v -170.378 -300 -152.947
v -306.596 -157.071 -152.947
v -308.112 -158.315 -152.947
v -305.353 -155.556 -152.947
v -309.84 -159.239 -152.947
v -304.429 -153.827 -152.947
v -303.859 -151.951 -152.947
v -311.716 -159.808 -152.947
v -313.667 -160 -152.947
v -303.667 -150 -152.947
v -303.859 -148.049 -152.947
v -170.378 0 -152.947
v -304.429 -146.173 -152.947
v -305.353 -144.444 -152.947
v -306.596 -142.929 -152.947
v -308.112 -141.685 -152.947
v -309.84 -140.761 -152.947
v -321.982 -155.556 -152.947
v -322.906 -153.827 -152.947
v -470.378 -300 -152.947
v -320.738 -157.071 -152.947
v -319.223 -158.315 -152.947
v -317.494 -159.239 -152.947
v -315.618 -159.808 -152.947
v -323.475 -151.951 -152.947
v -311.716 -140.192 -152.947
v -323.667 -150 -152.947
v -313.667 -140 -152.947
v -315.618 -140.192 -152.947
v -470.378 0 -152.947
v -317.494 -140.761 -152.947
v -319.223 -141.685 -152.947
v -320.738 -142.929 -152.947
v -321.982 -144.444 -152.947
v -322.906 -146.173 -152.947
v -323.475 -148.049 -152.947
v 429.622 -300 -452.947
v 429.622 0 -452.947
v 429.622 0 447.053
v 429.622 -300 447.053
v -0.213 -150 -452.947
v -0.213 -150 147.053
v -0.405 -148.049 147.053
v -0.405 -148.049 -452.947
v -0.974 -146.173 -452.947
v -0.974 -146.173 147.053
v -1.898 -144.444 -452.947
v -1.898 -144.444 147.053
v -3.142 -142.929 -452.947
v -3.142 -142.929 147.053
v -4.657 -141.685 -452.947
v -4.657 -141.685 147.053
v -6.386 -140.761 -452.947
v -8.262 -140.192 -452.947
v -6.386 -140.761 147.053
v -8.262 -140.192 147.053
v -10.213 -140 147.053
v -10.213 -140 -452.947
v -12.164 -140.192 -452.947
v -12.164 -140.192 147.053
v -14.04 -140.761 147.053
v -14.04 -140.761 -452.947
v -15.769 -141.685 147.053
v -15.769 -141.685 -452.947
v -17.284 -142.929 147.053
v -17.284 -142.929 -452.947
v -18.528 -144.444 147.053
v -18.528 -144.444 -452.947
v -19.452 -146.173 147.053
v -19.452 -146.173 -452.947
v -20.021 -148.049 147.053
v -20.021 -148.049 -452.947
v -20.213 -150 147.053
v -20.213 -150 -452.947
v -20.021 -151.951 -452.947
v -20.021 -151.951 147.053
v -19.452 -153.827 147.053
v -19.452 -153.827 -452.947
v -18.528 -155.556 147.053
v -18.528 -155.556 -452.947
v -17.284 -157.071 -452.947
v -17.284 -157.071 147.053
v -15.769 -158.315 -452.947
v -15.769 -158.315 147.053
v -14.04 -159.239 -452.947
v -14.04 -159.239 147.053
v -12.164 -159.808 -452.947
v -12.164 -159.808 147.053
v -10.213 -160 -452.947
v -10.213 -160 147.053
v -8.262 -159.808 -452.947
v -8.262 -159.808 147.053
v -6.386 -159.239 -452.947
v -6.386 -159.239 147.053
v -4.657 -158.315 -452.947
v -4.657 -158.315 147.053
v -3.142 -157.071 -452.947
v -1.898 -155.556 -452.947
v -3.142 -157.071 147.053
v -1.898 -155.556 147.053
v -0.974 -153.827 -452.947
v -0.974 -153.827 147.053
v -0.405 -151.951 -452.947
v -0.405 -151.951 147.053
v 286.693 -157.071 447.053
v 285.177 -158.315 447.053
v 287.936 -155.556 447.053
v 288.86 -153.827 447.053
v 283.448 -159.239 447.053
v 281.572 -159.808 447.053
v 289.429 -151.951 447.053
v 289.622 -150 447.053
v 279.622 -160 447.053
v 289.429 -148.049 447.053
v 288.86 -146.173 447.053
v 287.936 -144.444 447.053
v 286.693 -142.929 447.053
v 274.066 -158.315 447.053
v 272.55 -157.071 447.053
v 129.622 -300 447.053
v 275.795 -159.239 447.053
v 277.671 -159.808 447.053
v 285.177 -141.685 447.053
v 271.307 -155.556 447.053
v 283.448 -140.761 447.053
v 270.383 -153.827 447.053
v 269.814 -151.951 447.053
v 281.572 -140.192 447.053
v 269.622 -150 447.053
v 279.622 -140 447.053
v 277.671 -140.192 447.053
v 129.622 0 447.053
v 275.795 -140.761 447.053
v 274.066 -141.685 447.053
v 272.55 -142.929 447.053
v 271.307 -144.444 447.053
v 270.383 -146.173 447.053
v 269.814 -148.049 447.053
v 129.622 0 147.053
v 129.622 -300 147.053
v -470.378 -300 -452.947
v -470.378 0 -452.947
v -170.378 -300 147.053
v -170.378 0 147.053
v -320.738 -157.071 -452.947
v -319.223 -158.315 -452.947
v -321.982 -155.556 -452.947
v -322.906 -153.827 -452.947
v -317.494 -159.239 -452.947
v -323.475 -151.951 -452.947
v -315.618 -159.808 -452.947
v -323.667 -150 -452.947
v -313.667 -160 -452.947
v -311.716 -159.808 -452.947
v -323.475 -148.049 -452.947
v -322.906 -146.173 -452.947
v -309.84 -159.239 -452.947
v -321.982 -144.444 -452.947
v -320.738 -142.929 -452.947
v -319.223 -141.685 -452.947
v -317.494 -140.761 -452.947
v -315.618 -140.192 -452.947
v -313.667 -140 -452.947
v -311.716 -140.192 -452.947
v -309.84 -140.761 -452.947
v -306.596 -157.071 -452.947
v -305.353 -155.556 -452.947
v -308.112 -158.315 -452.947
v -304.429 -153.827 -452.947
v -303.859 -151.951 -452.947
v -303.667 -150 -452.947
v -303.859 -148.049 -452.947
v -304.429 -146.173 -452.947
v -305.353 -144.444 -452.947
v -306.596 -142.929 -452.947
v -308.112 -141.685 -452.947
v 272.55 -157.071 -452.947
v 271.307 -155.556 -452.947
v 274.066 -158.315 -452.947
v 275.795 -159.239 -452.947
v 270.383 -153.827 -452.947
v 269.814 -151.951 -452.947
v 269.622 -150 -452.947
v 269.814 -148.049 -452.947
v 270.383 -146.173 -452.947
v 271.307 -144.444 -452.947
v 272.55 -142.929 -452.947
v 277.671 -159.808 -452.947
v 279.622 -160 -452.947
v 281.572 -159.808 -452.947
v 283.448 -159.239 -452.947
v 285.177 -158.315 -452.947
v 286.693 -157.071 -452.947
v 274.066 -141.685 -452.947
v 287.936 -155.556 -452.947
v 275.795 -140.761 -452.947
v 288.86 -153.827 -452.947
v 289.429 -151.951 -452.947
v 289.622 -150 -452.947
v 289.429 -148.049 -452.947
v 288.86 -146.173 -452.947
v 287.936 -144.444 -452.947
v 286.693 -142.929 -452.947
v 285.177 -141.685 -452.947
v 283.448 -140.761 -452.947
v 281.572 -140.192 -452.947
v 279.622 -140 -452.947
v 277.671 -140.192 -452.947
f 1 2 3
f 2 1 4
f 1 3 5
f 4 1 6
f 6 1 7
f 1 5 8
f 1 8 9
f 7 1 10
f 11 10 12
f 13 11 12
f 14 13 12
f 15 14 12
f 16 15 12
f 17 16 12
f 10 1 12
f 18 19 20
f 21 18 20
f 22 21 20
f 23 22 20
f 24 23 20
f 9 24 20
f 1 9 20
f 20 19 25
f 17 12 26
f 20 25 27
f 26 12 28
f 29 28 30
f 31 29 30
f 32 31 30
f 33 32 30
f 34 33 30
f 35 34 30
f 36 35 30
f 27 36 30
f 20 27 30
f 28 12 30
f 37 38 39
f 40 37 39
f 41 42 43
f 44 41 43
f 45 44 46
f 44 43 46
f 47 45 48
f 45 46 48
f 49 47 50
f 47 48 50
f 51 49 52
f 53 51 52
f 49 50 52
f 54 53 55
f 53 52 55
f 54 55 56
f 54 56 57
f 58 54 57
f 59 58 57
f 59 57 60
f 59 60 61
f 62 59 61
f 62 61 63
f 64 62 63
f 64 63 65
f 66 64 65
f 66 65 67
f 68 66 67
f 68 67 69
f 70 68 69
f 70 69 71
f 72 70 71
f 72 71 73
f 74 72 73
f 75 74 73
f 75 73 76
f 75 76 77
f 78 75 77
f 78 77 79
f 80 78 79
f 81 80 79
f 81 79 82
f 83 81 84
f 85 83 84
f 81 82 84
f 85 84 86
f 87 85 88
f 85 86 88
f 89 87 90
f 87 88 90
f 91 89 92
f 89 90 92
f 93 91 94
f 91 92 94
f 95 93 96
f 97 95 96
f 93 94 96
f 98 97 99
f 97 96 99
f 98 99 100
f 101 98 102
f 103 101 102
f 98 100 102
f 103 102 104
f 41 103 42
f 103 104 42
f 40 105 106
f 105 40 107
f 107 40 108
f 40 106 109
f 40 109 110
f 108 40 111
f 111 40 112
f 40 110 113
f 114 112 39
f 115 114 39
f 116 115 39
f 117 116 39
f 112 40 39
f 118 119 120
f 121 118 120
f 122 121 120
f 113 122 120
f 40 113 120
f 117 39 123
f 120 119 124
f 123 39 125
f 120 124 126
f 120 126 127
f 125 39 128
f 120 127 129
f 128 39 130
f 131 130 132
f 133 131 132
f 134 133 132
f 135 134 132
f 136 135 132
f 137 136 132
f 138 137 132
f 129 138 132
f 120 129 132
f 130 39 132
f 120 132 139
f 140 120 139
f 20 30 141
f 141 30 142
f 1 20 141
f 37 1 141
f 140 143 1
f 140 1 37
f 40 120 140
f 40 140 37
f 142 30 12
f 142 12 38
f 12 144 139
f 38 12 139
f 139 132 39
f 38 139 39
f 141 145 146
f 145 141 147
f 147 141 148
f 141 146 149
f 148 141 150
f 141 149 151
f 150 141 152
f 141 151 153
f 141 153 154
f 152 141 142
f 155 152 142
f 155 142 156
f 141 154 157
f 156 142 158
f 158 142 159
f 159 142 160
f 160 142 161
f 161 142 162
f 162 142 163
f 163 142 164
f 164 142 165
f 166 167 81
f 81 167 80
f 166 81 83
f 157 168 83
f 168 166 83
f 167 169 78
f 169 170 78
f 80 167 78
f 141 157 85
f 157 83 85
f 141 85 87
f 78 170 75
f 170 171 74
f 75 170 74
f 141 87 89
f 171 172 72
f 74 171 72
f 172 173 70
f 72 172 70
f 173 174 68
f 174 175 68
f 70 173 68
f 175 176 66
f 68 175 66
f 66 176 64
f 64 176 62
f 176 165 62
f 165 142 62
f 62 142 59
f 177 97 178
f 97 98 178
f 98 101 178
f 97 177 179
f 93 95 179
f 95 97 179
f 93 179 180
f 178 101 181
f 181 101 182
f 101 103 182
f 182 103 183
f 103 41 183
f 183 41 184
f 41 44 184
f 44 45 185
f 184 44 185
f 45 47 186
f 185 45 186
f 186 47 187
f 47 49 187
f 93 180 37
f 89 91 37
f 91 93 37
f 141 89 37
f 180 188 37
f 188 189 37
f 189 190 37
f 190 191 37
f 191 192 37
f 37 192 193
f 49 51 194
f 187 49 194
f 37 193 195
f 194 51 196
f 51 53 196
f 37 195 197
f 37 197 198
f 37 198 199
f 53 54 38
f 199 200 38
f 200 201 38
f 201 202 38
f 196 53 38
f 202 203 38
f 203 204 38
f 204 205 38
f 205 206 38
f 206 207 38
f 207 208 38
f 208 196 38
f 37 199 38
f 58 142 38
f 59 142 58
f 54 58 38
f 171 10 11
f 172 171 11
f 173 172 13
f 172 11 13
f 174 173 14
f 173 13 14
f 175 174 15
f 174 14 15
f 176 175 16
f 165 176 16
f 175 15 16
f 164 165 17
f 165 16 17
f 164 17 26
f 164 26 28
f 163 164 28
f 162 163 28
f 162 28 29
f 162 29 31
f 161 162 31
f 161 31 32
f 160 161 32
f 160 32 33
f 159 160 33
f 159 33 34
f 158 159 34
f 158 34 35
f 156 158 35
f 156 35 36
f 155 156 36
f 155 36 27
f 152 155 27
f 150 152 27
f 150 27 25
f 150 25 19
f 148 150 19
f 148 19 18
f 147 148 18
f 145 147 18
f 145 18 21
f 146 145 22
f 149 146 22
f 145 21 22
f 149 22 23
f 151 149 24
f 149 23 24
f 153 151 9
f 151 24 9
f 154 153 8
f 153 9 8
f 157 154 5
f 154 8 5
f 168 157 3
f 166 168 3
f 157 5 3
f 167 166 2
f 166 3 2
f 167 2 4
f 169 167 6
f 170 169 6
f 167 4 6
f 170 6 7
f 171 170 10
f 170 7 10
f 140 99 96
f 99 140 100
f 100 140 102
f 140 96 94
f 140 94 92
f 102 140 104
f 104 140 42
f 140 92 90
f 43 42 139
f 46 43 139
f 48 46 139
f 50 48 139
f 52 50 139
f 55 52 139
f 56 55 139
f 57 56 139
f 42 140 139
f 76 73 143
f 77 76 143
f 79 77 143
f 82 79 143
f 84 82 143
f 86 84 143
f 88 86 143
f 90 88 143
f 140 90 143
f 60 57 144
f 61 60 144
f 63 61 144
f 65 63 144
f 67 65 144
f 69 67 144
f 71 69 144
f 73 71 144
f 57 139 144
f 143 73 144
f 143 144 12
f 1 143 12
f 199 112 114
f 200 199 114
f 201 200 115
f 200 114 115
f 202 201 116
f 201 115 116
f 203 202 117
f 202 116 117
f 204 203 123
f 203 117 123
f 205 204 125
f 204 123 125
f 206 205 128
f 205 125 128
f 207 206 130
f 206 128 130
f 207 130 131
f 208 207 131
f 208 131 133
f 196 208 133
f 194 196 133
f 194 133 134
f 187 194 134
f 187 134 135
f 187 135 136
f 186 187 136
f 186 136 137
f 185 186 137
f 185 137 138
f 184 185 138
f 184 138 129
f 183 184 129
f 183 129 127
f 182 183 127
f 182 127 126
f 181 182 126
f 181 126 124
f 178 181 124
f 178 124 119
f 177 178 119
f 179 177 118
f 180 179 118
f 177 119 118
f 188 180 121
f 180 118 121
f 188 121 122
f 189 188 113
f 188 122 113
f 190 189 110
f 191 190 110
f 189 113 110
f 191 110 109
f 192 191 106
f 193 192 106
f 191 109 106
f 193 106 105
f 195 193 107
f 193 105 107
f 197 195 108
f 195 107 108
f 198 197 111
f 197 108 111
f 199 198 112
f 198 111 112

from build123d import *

# Parameters (mm, degrees)
F1_DEPTH = 300
F2_R     = 10
F3_DEPTH = 900.001


with BuildPart() as f1:
    # F0 (on Front) → F1 (new body)
    with BuildSketch(Plane.XZ):
        Polygon((-470.378462, -452.94658), (429.621538, -452.94658), (429.621538, 447.05342), (129.621538, 447.05342), (129.621538, 147.05342), (-170.378462, 147.05342), (-170.378462, -152.94658), (-470.378462, -152.94658), align=None)
    extrude(amount=F1_DEPTH)

    # F2 (on face) → F3 (cut, through all)
    with BuildSketch(Plane.XY.offset(447.05342)):
        with Locations((279.621538, -150)):
            Circle(F2_R)
        with Locations((-10.213119, -150)):
            Circle(F2_R)
        with Locations((-313.667297, -150)):
            Circle(F2_R)
    extrude(amount=-F3_DEPTH, mode=Mode.SUBTRACT)


solid = f1.part
